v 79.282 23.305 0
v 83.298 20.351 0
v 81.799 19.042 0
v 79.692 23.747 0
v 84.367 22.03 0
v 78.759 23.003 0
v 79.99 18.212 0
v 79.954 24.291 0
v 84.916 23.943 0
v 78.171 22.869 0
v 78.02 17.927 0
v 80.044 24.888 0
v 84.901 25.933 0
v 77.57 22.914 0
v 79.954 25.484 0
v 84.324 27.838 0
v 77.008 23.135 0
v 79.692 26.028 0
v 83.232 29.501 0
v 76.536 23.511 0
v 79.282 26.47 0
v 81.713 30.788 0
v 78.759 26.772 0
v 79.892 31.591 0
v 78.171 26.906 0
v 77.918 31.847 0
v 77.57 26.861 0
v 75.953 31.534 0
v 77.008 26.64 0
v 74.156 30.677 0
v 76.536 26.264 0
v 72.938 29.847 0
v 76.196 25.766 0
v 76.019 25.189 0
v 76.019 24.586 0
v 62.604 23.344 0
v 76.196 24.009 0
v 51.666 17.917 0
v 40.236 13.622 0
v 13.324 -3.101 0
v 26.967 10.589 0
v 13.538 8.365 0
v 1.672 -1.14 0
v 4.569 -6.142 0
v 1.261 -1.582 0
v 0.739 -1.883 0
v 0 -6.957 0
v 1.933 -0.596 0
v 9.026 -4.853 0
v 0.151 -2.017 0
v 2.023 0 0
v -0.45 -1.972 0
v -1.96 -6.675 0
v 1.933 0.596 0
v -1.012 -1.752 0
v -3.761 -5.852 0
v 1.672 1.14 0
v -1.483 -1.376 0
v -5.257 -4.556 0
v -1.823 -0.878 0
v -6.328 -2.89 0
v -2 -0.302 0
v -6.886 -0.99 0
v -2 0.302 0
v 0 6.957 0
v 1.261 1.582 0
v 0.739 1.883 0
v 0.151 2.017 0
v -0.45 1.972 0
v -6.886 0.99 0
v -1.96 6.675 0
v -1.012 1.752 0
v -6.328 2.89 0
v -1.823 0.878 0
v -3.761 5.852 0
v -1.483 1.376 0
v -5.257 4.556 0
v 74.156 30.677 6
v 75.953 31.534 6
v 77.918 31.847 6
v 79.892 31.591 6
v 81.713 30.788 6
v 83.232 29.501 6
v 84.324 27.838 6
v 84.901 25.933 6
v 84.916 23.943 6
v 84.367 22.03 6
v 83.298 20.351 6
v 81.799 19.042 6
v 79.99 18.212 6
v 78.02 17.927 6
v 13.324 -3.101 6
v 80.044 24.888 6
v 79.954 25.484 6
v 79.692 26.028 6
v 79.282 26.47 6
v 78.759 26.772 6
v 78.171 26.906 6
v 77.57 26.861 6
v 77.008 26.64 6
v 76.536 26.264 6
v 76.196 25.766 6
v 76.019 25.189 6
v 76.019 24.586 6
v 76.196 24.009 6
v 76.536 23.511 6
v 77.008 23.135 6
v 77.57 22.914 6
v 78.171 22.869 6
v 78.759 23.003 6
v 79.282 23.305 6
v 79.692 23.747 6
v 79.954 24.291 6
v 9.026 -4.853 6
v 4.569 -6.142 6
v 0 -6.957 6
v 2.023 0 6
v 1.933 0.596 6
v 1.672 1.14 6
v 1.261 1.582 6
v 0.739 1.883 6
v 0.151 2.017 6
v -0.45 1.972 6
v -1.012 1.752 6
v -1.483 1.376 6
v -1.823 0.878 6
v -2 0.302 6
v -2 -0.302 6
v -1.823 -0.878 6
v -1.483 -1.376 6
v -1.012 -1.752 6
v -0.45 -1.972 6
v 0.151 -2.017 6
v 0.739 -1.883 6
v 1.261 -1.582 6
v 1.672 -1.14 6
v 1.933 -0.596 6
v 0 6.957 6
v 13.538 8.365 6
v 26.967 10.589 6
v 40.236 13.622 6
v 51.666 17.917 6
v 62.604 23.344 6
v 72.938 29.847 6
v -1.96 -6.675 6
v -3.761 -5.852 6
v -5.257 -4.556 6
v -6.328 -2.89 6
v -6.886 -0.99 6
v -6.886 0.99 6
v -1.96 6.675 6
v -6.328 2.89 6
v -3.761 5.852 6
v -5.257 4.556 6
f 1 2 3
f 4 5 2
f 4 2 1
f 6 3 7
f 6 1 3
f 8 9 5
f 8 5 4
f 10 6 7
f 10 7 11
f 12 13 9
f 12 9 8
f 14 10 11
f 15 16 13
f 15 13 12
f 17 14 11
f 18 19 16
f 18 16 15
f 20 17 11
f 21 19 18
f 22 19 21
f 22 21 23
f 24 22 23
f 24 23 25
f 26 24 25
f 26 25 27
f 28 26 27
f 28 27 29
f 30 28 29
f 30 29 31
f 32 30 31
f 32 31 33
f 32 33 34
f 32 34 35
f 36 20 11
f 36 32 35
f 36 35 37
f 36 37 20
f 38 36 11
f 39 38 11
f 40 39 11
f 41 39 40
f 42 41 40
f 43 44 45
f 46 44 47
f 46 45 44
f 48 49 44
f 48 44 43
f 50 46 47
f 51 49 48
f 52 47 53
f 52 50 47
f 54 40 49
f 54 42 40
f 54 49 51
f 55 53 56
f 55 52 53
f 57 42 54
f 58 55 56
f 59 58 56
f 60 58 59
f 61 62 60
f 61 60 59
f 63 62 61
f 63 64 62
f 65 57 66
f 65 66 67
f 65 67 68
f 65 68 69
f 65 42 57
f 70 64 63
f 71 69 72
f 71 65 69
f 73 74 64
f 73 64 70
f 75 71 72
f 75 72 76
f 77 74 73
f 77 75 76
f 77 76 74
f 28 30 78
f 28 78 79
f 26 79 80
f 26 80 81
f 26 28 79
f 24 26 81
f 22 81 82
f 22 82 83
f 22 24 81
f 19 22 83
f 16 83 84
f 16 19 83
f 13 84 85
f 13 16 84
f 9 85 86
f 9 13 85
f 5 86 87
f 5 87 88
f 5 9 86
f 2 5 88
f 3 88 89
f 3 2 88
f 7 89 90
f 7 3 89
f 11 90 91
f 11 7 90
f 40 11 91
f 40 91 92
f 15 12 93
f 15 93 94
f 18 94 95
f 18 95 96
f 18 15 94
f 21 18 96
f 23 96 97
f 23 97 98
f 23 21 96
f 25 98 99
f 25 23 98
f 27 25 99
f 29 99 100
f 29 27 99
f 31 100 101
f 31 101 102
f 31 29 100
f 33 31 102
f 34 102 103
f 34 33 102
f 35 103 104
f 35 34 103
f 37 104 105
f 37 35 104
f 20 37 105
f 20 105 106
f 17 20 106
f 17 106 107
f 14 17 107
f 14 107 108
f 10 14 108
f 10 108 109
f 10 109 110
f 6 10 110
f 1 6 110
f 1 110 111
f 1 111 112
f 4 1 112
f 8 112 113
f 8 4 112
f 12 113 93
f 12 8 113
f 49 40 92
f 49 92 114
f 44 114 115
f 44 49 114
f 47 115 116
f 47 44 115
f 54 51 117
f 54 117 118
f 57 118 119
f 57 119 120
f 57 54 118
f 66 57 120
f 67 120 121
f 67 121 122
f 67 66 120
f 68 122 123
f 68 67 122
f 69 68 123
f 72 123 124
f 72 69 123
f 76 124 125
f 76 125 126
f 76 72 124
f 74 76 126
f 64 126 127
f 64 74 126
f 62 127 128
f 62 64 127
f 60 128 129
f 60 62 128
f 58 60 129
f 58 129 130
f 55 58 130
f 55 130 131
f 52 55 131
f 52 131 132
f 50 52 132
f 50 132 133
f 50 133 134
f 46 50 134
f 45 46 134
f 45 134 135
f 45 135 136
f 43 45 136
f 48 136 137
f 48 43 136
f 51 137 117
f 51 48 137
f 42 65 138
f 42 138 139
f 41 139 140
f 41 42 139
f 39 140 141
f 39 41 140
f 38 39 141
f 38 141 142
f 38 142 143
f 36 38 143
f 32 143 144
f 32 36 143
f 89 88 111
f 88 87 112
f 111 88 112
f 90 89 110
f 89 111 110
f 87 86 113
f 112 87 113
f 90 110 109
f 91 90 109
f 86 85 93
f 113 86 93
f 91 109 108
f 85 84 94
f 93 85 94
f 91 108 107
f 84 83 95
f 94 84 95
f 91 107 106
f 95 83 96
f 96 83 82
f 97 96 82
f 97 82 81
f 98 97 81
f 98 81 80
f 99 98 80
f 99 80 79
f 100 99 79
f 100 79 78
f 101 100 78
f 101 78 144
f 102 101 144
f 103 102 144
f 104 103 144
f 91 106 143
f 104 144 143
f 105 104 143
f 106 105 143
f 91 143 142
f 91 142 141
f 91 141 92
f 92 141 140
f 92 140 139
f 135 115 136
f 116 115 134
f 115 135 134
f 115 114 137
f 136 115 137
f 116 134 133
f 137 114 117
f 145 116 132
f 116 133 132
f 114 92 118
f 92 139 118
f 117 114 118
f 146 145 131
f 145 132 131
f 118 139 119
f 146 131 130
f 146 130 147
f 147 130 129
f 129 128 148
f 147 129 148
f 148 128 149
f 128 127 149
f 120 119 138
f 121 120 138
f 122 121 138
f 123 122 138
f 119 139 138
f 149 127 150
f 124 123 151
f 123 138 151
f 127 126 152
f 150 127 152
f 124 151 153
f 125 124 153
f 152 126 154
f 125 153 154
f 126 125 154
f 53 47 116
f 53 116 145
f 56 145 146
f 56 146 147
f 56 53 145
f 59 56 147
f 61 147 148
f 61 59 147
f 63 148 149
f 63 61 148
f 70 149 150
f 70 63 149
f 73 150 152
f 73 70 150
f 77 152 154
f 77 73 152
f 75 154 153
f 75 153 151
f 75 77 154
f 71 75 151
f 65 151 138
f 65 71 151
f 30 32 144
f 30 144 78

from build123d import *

# Parameters (mm, degrees)
SKETCH1_R           = 2.023987864
SKETCH1_R_2         = 2.023043511
BOSS_EXTRUDE1_DEPTH = 6


with BuildPart() as part:
    # Sketch1 → Boss-Extrude1 (new body)
    with BuildSketch(Plane.XY):
        with BuildLine():
            ThreePointArc((40.235925581, 13.621604134), (57.203735223, 20.491828906), (72.938383073, 29.847437358))
            Line((72.938383073, 29.847437358), (74.156447949, 30.67709719))
            ThreePointArc((74.156447949, 30.67709719), (84.681220688, 26.906078771), (78.020019153, 17.927224989))
            Line((78.020019153, 17.927224989), (13.323500668, -3.100956986))
            ThreePointArc((13.323500668, -3.100956986), (6.814395622, -5.556227345), (0, -6.956517793))
            ThreePointArc((0, -6.956517793), (-6.956517793, 0), (0, 6.956517793))
            ThreePointArc((0, 6.956517793), (20.269294729, 9.375497313), (40.235925581, 13.621604134))
        make_face()
        with Locations((78.020019153, 24.887546661)):
            Circle(SKETCH1_R, mode=Mode.SUBTRACT)
        Circle(SKETCH1_R_2, mode=Mode.SUBTRACT)
    extrude(amount=BOSS_EXTRUDE1_DEPTH)


solid = part.part
